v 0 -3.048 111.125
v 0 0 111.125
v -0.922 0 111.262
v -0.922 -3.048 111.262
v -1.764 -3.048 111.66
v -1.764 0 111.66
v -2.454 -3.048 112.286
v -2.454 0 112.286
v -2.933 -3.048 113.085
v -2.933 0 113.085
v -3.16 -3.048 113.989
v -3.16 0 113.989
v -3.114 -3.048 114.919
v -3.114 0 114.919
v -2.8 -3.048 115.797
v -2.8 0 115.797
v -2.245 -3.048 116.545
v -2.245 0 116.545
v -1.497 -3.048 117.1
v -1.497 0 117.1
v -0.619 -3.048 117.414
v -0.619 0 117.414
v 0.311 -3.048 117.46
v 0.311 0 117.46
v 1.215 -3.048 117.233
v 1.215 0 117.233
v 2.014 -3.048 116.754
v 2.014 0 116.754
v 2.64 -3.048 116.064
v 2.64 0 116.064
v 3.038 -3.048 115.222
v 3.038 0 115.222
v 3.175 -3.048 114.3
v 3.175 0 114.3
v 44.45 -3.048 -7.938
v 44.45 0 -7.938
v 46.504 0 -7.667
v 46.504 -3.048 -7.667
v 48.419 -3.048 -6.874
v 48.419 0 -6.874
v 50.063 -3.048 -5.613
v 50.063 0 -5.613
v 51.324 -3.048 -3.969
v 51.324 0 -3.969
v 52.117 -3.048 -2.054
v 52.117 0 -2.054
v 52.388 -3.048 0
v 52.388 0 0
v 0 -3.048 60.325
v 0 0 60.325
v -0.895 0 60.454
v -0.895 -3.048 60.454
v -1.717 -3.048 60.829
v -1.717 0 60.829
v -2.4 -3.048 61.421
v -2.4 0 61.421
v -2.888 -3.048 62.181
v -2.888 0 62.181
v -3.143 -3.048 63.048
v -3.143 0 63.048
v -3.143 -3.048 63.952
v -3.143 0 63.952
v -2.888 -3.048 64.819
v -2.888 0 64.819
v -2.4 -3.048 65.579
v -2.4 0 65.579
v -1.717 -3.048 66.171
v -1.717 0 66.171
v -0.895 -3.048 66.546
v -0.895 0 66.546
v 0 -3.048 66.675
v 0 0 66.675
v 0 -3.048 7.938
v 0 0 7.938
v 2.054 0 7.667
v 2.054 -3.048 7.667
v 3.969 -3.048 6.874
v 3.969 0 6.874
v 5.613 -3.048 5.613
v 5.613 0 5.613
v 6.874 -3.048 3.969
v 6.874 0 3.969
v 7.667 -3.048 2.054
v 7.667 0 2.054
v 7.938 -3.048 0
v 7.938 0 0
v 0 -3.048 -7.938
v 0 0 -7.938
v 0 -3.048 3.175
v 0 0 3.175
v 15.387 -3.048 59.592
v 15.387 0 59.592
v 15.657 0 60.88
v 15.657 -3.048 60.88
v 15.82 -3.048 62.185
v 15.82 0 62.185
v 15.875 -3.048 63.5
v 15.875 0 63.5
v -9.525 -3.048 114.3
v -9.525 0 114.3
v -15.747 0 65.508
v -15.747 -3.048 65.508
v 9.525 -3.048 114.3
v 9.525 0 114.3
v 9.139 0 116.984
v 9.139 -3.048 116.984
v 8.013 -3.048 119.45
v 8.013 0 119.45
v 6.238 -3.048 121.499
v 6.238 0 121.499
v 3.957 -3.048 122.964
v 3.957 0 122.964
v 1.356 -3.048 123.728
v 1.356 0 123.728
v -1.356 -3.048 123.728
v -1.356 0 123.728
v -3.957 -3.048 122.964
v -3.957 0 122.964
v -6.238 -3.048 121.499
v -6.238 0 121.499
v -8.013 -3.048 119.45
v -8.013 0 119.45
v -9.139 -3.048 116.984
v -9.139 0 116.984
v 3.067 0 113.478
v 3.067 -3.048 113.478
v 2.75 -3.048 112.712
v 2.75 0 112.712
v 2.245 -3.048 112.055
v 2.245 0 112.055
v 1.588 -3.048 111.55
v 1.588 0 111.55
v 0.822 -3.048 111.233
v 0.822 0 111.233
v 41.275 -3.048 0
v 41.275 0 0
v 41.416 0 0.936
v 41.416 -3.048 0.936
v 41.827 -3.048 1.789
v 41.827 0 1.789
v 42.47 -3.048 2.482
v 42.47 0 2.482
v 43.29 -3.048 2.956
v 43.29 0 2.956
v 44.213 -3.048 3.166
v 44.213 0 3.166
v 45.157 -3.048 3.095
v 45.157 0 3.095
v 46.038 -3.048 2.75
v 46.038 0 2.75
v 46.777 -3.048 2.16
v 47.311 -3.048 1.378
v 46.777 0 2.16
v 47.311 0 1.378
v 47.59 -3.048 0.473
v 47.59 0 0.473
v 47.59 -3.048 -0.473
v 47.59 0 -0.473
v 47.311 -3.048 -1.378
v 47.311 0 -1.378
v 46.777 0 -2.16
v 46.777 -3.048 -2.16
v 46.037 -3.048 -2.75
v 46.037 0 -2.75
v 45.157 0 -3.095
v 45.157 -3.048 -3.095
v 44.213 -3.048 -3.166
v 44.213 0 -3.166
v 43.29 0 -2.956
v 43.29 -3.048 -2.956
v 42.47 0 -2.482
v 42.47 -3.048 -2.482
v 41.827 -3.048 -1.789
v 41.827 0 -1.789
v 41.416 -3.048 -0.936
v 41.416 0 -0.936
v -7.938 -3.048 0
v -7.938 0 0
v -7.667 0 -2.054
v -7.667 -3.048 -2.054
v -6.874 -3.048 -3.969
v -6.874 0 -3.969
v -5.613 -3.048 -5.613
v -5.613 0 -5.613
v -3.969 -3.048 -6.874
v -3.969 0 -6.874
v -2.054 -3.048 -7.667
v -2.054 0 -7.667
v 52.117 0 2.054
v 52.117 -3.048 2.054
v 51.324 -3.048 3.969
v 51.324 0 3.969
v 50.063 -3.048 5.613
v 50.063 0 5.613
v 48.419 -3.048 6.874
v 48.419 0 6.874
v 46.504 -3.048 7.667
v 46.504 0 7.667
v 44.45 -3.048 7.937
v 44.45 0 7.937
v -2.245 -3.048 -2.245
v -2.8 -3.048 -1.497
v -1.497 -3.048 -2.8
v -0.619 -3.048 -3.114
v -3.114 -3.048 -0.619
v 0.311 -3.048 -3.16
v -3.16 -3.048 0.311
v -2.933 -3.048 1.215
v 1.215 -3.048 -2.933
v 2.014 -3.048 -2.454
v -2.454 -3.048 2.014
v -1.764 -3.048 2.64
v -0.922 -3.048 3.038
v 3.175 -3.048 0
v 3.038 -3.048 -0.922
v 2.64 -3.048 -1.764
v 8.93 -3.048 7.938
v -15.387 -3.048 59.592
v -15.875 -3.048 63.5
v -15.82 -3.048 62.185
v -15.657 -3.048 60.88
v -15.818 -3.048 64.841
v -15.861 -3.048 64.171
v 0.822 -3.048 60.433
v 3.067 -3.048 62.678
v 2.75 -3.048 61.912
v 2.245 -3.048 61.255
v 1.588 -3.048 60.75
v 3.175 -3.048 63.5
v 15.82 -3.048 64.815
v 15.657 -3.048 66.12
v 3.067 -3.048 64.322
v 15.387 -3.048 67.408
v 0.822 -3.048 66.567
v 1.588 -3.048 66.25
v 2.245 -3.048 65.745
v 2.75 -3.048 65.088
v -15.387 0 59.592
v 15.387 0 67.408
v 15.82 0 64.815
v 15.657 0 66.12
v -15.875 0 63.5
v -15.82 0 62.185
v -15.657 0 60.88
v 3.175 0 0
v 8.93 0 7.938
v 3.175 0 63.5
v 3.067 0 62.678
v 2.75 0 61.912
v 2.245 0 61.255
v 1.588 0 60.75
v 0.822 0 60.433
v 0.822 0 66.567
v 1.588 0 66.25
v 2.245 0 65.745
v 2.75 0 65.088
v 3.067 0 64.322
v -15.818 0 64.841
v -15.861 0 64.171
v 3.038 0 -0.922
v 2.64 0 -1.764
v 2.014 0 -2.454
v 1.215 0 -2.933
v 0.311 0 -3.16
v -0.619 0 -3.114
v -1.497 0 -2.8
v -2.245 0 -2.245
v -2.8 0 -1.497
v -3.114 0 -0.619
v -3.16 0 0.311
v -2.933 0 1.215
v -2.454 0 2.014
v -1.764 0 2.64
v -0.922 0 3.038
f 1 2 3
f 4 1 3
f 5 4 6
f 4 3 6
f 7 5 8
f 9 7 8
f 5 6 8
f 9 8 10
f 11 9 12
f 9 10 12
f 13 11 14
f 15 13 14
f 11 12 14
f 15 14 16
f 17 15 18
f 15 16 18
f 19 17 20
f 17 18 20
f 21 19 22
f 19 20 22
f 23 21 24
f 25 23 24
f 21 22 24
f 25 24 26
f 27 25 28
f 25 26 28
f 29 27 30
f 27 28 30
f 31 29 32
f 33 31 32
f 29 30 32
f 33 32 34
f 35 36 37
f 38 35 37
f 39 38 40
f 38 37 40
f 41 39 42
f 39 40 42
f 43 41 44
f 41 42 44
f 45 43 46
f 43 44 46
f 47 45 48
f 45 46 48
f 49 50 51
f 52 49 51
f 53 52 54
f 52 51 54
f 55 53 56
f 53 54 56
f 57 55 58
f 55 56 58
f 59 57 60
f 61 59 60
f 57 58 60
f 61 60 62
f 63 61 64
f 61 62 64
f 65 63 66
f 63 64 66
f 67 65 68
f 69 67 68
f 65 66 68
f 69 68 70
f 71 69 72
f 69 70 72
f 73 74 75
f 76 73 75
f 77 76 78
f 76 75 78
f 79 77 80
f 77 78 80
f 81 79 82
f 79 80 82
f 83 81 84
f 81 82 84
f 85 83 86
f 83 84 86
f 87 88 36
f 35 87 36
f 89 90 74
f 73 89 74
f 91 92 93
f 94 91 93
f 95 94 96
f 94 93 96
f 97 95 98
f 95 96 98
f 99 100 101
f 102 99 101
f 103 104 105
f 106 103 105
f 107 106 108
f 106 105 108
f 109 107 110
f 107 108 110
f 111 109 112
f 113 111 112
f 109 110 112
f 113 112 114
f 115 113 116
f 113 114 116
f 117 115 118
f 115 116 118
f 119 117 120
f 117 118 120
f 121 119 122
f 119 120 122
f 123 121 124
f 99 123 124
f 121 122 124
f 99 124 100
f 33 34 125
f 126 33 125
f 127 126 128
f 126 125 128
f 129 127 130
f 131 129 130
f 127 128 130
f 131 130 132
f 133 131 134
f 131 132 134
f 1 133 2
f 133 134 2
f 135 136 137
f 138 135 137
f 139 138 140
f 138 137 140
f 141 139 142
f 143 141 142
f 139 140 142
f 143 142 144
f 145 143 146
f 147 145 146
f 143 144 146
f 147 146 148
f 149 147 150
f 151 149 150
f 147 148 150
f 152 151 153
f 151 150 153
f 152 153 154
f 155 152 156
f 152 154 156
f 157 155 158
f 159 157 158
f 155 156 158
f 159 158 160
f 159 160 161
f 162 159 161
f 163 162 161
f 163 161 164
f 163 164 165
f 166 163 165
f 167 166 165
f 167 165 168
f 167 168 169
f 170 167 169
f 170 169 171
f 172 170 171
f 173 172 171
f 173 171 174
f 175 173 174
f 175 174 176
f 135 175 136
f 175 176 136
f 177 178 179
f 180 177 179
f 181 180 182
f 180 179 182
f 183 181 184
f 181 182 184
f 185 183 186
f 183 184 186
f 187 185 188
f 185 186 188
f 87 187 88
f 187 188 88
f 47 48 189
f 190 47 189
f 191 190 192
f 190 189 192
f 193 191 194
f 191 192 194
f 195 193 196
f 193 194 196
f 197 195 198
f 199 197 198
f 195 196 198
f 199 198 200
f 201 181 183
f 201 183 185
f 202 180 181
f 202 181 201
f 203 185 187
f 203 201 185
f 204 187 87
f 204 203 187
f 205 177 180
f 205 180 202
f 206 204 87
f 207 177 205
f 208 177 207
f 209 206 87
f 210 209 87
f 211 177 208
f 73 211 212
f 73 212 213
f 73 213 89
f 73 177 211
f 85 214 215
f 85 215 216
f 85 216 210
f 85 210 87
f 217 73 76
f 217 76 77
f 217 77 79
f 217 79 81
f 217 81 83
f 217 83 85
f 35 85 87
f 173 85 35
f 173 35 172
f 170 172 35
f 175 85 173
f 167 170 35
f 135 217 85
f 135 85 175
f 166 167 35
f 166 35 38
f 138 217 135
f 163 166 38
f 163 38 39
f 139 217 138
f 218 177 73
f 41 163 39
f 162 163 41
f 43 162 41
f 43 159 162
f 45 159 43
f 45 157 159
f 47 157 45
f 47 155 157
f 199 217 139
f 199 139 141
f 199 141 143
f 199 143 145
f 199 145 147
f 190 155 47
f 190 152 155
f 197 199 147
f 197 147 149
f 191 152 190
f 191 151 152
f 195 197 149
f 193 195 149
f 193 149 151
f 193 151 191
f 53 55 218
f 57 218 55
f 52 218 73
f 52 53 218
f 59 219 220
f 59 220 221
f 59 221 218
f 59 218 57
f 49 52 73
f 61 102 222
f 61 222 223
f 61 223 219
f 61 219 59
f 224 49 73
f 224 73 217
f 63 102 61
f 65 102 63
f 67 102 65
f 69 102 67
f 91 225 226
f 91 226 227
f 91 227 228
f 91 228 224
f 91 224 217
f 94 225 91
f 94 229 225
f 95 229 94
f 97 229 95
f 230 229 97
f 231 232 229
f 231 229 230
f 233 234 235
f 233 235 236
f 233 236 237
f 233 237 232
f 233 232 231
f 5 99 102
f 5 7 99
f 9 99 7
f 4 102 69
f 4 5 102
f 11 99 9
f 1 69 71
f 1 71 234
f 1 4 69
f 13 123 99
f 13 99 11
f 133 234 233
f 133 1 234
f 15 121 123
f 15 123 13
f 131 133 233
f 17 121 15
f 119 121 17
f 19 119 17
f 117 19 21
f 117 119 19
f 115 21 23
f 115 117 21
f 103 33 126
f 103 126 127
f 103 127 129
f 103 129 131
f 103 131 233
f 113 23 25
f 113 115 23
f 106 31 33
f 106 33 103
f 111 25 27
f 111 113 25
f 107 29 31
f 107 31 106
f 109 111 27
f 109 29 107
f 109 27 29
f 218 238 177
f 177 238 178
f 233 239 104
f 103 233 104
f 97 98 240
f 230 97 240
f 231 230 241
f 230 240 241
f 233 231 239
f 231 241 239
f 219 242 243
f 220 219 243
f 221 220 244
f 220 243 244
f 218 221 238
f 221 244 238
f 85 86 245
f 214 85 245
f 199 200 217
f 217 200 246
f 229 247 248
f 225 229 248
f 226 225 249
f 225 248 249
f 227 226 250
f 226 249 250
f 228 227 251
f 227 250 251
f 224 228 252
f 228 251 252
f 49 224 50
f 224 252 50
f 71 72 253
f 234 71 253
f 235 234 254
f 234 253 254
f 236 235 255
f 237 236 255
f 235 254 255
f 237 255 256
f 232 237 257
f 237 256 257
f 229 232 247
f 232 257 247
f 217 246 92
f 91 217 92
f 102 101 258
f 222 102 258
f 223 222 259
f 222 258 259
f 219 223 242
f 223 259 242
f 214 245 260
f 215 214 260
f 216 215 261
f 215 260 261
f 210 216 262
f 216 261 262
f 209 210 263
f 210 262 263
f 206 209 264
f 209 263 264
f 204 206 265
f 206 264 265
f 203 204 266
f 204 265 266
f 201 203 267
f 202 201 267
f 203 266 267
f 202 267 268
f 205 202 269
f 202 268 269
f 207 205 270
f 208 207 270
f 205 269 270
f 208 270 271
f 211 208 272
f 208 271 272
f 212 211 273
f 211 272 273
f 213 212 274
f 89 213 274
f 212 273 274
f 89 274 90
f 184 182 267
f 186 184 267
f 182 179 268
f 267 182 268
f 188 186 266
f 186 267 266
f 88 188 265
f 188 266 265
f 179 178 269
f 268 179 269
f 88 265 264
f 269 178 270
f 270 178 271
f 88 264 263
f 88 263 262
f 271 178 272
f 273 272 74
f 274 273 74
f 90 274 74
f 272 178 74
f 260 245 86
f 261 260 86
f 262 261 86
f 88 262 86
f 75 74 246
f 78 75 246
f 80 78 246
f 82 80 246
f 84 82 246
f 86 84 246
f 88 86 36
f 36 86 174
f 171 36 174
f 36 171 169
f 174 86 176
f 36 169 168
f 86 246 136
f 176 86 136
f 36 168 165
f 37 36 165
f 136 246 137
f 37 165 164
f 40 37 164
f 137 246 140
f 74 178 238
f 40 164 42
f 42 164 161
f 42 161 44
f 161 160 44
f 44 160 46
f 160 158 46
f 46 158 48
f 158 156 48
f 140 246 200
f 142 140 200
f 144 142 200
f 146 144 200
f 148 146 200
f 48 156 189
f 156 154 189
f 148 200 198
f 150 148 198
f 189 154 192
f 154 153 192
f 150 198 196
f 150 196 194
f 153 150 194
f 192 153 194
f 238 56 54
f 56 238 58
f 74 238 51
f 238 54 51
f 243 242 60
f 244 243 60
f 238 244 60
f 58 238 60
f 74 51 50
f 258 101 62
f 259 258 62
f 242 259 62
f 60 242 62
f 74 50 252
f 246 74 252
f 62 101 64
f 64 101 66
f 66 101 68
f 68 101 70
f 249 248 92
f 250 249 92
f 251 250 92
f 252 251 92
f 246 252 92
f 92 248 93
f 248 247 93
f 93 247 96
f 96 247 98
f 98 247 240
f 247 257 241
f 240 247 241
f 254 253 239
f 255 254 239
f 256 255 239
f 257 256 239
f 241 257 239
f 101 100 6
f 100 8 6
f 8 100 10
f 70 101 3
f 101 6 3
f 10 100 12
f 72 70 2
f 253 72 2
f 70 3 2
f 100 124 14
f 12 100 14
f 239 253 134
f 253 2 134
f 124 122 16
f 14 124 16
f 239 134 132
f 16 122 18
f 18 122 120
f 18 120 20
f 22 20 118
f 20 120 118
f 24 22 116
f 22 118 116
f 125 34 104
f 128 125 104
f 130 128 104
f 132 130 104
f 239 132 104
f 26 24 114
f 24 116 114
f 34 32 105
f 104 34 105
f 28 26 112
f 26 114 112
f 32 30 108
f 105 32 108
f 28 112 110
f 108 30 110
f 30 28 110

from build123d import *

# Parameters (mm, degrees)
F1_DEPTH = 3.048


with BuildPart() as f1:
    # F0 (on Front) → F1 (new body)
    with BuildSketch(Plane.XZ):
        with BuildLine():
            Line((7.9375, 0), (3.175, 0))
            ThreePointArc((3.175, 0), (-2.2450640303, -2.2450640303), (0, 3.175))
            Line((0, 3.175), (0, 7.9375))
            ThreePointArc((0, 7.9375), (-5.6126600757, 5.6126600757), (-7.9375, 0))
            ThreePointArc((-7.9375, 0), (-5.6126600757, -5.6126600757), (0, -7.9375))
            ThreePointArc((0, -7.9375), (5.6126600757, -5.6126600757), (7.9375, 0))
        make_face()
        with BuildLine():
            Line((8.9296875, 7.9375), (7.9375, 0))
            Line((7.9375, 0), (36.5125, 0))
            ThreePointArc((36.5125, 0), (38.8373399243, 5.6126600757), (44.45, 7.9375))
            Line((44.45, 7.9375), (9.9234625, 7.9375))
            Line((9.9234625, 7.9375), (8.9296875, 7.9375))
        make_face()
        with BuildLine():
            Line((36.5125, 0), (7.9375, 0))
            ThreePointArc((7.9375, 0), (5.6126600757, -5.6126600757), (0, -7.9375))
            Line((0, -7.9375), (44.45, -7.9375))
            ThreePointArc((44.45, -7.9375), (38.8373399243, -5.6126600757), (36.5125, 0))
        make_face()
        with BuildLine():
            ThreePointArc((0, 7.9375), (5.6126600757, 5.6126600757), (7.9375, 0))
            Line((7.9375, 0), (8.9296875, 7.9375))
            Line((8.9296875, 7.9375), (0, 7.9375))
        make_face()
        with BuildLine():
            ThreePointArc((-7.9375, 0), (-5.6126600757, 5.6126600757), (0, 7.9375))
            Line((0, 7.9375), (0, 47.625))
            ThreePointArc((0, 47.625), (-9.7463072395, 50.9690335492), (-15.3865384615, 59.5923076923))
            Line((-15.3865384615, 59.5923076923), (-7.9375, 0))
        make_face()
        with BuildLine():
            Line((0, 47.625), (0, 7.9375))
            Line((0, 7.9375), (8.9296875, 7.9375))
            Line((8.9296875, 7.9375), (15.3865384615, 59.5923076923))
            ThreePointArc((15.3865384615, 59.5923076923), (9.7463072395, 50.9690335492), (0, 47.625))
        make_face()
        with BuildLine():
            ThreePointArc((44.45, 7.9375), (38.8373399243, 5.6126600757), (36.5125, 0))
            ThreePointArc((36.5125, 0), (38.8373399243, -5.6126600757), (44.45, -7.9375))
            ThreePointArc((44.45, -7.9375), (50.0626600757, -5.6126600757), (52.3875, 0))
            ThreePointArc((52.3875, 0), (50.0626600757, 5.6126600757), (44.45, 7.9375))
        make_face()
        with BuildLine():
            ThreePointArc((47.625, 0), (44.45, -3.175), (41.275, 0))
            ThreePointArc((41.275, 0), (44.45, 3.175), (47.625, 0))
        make_face(mode=Mode.SUBTRACT)
        with BuildLine():
            ThreePointArc((-15.3865384615, 59.5923076923), (-9.7463072395, 50.9690335492), (0, 47.625))
            Line((0, 47.625), (0, 60.325))
            ThreePointArc((0, 60.325), (-3.175, 63.5), (0, 66.675))
            Line((0, 66.675), (0, 79.375))
            ThreePointArc((0, 79.375), (-10.4912828548, 75.4142187767), (-15.7474569047, 65.5082893304))
            ThreePointArc((-15.7474569047, 65.5082893304), (-15.8430821396, 64.5061676396), (-15.875, 63.5))
            Line((-15.875, 63.5), (-15.3865384615, 59.5923076923))
        make_face()
        with BuildLine():
            Line((0, 60.325), (0, 47.625))
            ThreePointArc((0, 47.625), (9.7463072395, 50.9690335492), (15.3865384615, 59.5923076923))
            Line((15.3865384615, 59.5923076923), (15.875, 63.5))
            Line((15.875, 63.5), (15.3865384615, 67.4076923077))
            ThreePointArc((15.3865384615, 67.4076923077), (9.7463072395, 76.0309664508), (0, 79.375))
            Line((0, 79.375), (0, 66.675))
            ThreePointArc((0, 66.675), (2.2450640303, 65.7450640303), (3.175, 63.5))
            ThreePointArc((3.175, 63.5), (2.2450640303, 61.2549359697), (0, 60.325))
        make_face()
        with BuildLine():
            Line((15.875, 63.5), (15.3865384615, 59.5923076923))
            ThreePointArc((15.3865384615, 59.5923076923), (15.7524112928, 61.5309485884), (15.875, 63.5))
        make_face()
        with BuildLine():
            ThreePointArc((-15.875, 63.5), (-15.7524112928, 61.5309485884), (-15.3865384615, 59.5923076923))
            Line((-15.3865384615, 59.5923076923), (-15.875, 63.5))
        make_face()
        with BuildLine():
            Line((15.3865384615, 67.4076923077), (15.875, 63.5))
            ThreePointArc((15.875, 63.5), (15.7524112928, 65.4690514116), (15.3865384615, 67.4076923077))
        make_face()
        with BuildLine():
            ThreePointArc((0, 79.375), (9.7463072395, 76.0309664508), (15.3865384615, 67.4076923077))
            Line((15.3865384615, 67.4076923077), (9.525, 114.3))
            ThreePointArc((9.525, 114.3), (6.7351920908, 107.5648079092), (0, 104.775))
            Line((0, 104.775), (0, 79.375))
        make_face()
        with BuildLine():
            ThreePointArc((-15.7474569047, 65.5082893304), (-10.4912828548, 75.4142187767), (0, 79.375))
            Line((0, 79.375), (0, 104.775))
            ThreePointArc((0, 104.775), (-6.7351920908, 107.5648079092), (-9.525, 114.3))
            Line((-9.525, 114.3), (-15.7474569047, 65.5082893304))
        make_face()
        with BuildLine():
            ThreePointArc((0, 104.775), (6.7351920908, 107.5648079092), (9.525, 114.3))
            ThreePointArc((9.525, 114.3), (0, 123.825), (-9.525, 114.3))
            ThreePointArc((-9.525, 114.3), (-6.7351920908, 107.5648079092), (0, 104.775))
        make_face()
        with BuildLine():
            ThreePointArc((3.175, 114.3), (2.2450640303, 112.0549359697), (0, 111.125))
            ThreePointArc((0, 111.125), (-2.2450640303, 116.5450640303), (3.175, 114.3))
        make_face(mode=Mode.SUBTRACT)
    extrude(amount=F1_DEPTH)


solid = f1.part
